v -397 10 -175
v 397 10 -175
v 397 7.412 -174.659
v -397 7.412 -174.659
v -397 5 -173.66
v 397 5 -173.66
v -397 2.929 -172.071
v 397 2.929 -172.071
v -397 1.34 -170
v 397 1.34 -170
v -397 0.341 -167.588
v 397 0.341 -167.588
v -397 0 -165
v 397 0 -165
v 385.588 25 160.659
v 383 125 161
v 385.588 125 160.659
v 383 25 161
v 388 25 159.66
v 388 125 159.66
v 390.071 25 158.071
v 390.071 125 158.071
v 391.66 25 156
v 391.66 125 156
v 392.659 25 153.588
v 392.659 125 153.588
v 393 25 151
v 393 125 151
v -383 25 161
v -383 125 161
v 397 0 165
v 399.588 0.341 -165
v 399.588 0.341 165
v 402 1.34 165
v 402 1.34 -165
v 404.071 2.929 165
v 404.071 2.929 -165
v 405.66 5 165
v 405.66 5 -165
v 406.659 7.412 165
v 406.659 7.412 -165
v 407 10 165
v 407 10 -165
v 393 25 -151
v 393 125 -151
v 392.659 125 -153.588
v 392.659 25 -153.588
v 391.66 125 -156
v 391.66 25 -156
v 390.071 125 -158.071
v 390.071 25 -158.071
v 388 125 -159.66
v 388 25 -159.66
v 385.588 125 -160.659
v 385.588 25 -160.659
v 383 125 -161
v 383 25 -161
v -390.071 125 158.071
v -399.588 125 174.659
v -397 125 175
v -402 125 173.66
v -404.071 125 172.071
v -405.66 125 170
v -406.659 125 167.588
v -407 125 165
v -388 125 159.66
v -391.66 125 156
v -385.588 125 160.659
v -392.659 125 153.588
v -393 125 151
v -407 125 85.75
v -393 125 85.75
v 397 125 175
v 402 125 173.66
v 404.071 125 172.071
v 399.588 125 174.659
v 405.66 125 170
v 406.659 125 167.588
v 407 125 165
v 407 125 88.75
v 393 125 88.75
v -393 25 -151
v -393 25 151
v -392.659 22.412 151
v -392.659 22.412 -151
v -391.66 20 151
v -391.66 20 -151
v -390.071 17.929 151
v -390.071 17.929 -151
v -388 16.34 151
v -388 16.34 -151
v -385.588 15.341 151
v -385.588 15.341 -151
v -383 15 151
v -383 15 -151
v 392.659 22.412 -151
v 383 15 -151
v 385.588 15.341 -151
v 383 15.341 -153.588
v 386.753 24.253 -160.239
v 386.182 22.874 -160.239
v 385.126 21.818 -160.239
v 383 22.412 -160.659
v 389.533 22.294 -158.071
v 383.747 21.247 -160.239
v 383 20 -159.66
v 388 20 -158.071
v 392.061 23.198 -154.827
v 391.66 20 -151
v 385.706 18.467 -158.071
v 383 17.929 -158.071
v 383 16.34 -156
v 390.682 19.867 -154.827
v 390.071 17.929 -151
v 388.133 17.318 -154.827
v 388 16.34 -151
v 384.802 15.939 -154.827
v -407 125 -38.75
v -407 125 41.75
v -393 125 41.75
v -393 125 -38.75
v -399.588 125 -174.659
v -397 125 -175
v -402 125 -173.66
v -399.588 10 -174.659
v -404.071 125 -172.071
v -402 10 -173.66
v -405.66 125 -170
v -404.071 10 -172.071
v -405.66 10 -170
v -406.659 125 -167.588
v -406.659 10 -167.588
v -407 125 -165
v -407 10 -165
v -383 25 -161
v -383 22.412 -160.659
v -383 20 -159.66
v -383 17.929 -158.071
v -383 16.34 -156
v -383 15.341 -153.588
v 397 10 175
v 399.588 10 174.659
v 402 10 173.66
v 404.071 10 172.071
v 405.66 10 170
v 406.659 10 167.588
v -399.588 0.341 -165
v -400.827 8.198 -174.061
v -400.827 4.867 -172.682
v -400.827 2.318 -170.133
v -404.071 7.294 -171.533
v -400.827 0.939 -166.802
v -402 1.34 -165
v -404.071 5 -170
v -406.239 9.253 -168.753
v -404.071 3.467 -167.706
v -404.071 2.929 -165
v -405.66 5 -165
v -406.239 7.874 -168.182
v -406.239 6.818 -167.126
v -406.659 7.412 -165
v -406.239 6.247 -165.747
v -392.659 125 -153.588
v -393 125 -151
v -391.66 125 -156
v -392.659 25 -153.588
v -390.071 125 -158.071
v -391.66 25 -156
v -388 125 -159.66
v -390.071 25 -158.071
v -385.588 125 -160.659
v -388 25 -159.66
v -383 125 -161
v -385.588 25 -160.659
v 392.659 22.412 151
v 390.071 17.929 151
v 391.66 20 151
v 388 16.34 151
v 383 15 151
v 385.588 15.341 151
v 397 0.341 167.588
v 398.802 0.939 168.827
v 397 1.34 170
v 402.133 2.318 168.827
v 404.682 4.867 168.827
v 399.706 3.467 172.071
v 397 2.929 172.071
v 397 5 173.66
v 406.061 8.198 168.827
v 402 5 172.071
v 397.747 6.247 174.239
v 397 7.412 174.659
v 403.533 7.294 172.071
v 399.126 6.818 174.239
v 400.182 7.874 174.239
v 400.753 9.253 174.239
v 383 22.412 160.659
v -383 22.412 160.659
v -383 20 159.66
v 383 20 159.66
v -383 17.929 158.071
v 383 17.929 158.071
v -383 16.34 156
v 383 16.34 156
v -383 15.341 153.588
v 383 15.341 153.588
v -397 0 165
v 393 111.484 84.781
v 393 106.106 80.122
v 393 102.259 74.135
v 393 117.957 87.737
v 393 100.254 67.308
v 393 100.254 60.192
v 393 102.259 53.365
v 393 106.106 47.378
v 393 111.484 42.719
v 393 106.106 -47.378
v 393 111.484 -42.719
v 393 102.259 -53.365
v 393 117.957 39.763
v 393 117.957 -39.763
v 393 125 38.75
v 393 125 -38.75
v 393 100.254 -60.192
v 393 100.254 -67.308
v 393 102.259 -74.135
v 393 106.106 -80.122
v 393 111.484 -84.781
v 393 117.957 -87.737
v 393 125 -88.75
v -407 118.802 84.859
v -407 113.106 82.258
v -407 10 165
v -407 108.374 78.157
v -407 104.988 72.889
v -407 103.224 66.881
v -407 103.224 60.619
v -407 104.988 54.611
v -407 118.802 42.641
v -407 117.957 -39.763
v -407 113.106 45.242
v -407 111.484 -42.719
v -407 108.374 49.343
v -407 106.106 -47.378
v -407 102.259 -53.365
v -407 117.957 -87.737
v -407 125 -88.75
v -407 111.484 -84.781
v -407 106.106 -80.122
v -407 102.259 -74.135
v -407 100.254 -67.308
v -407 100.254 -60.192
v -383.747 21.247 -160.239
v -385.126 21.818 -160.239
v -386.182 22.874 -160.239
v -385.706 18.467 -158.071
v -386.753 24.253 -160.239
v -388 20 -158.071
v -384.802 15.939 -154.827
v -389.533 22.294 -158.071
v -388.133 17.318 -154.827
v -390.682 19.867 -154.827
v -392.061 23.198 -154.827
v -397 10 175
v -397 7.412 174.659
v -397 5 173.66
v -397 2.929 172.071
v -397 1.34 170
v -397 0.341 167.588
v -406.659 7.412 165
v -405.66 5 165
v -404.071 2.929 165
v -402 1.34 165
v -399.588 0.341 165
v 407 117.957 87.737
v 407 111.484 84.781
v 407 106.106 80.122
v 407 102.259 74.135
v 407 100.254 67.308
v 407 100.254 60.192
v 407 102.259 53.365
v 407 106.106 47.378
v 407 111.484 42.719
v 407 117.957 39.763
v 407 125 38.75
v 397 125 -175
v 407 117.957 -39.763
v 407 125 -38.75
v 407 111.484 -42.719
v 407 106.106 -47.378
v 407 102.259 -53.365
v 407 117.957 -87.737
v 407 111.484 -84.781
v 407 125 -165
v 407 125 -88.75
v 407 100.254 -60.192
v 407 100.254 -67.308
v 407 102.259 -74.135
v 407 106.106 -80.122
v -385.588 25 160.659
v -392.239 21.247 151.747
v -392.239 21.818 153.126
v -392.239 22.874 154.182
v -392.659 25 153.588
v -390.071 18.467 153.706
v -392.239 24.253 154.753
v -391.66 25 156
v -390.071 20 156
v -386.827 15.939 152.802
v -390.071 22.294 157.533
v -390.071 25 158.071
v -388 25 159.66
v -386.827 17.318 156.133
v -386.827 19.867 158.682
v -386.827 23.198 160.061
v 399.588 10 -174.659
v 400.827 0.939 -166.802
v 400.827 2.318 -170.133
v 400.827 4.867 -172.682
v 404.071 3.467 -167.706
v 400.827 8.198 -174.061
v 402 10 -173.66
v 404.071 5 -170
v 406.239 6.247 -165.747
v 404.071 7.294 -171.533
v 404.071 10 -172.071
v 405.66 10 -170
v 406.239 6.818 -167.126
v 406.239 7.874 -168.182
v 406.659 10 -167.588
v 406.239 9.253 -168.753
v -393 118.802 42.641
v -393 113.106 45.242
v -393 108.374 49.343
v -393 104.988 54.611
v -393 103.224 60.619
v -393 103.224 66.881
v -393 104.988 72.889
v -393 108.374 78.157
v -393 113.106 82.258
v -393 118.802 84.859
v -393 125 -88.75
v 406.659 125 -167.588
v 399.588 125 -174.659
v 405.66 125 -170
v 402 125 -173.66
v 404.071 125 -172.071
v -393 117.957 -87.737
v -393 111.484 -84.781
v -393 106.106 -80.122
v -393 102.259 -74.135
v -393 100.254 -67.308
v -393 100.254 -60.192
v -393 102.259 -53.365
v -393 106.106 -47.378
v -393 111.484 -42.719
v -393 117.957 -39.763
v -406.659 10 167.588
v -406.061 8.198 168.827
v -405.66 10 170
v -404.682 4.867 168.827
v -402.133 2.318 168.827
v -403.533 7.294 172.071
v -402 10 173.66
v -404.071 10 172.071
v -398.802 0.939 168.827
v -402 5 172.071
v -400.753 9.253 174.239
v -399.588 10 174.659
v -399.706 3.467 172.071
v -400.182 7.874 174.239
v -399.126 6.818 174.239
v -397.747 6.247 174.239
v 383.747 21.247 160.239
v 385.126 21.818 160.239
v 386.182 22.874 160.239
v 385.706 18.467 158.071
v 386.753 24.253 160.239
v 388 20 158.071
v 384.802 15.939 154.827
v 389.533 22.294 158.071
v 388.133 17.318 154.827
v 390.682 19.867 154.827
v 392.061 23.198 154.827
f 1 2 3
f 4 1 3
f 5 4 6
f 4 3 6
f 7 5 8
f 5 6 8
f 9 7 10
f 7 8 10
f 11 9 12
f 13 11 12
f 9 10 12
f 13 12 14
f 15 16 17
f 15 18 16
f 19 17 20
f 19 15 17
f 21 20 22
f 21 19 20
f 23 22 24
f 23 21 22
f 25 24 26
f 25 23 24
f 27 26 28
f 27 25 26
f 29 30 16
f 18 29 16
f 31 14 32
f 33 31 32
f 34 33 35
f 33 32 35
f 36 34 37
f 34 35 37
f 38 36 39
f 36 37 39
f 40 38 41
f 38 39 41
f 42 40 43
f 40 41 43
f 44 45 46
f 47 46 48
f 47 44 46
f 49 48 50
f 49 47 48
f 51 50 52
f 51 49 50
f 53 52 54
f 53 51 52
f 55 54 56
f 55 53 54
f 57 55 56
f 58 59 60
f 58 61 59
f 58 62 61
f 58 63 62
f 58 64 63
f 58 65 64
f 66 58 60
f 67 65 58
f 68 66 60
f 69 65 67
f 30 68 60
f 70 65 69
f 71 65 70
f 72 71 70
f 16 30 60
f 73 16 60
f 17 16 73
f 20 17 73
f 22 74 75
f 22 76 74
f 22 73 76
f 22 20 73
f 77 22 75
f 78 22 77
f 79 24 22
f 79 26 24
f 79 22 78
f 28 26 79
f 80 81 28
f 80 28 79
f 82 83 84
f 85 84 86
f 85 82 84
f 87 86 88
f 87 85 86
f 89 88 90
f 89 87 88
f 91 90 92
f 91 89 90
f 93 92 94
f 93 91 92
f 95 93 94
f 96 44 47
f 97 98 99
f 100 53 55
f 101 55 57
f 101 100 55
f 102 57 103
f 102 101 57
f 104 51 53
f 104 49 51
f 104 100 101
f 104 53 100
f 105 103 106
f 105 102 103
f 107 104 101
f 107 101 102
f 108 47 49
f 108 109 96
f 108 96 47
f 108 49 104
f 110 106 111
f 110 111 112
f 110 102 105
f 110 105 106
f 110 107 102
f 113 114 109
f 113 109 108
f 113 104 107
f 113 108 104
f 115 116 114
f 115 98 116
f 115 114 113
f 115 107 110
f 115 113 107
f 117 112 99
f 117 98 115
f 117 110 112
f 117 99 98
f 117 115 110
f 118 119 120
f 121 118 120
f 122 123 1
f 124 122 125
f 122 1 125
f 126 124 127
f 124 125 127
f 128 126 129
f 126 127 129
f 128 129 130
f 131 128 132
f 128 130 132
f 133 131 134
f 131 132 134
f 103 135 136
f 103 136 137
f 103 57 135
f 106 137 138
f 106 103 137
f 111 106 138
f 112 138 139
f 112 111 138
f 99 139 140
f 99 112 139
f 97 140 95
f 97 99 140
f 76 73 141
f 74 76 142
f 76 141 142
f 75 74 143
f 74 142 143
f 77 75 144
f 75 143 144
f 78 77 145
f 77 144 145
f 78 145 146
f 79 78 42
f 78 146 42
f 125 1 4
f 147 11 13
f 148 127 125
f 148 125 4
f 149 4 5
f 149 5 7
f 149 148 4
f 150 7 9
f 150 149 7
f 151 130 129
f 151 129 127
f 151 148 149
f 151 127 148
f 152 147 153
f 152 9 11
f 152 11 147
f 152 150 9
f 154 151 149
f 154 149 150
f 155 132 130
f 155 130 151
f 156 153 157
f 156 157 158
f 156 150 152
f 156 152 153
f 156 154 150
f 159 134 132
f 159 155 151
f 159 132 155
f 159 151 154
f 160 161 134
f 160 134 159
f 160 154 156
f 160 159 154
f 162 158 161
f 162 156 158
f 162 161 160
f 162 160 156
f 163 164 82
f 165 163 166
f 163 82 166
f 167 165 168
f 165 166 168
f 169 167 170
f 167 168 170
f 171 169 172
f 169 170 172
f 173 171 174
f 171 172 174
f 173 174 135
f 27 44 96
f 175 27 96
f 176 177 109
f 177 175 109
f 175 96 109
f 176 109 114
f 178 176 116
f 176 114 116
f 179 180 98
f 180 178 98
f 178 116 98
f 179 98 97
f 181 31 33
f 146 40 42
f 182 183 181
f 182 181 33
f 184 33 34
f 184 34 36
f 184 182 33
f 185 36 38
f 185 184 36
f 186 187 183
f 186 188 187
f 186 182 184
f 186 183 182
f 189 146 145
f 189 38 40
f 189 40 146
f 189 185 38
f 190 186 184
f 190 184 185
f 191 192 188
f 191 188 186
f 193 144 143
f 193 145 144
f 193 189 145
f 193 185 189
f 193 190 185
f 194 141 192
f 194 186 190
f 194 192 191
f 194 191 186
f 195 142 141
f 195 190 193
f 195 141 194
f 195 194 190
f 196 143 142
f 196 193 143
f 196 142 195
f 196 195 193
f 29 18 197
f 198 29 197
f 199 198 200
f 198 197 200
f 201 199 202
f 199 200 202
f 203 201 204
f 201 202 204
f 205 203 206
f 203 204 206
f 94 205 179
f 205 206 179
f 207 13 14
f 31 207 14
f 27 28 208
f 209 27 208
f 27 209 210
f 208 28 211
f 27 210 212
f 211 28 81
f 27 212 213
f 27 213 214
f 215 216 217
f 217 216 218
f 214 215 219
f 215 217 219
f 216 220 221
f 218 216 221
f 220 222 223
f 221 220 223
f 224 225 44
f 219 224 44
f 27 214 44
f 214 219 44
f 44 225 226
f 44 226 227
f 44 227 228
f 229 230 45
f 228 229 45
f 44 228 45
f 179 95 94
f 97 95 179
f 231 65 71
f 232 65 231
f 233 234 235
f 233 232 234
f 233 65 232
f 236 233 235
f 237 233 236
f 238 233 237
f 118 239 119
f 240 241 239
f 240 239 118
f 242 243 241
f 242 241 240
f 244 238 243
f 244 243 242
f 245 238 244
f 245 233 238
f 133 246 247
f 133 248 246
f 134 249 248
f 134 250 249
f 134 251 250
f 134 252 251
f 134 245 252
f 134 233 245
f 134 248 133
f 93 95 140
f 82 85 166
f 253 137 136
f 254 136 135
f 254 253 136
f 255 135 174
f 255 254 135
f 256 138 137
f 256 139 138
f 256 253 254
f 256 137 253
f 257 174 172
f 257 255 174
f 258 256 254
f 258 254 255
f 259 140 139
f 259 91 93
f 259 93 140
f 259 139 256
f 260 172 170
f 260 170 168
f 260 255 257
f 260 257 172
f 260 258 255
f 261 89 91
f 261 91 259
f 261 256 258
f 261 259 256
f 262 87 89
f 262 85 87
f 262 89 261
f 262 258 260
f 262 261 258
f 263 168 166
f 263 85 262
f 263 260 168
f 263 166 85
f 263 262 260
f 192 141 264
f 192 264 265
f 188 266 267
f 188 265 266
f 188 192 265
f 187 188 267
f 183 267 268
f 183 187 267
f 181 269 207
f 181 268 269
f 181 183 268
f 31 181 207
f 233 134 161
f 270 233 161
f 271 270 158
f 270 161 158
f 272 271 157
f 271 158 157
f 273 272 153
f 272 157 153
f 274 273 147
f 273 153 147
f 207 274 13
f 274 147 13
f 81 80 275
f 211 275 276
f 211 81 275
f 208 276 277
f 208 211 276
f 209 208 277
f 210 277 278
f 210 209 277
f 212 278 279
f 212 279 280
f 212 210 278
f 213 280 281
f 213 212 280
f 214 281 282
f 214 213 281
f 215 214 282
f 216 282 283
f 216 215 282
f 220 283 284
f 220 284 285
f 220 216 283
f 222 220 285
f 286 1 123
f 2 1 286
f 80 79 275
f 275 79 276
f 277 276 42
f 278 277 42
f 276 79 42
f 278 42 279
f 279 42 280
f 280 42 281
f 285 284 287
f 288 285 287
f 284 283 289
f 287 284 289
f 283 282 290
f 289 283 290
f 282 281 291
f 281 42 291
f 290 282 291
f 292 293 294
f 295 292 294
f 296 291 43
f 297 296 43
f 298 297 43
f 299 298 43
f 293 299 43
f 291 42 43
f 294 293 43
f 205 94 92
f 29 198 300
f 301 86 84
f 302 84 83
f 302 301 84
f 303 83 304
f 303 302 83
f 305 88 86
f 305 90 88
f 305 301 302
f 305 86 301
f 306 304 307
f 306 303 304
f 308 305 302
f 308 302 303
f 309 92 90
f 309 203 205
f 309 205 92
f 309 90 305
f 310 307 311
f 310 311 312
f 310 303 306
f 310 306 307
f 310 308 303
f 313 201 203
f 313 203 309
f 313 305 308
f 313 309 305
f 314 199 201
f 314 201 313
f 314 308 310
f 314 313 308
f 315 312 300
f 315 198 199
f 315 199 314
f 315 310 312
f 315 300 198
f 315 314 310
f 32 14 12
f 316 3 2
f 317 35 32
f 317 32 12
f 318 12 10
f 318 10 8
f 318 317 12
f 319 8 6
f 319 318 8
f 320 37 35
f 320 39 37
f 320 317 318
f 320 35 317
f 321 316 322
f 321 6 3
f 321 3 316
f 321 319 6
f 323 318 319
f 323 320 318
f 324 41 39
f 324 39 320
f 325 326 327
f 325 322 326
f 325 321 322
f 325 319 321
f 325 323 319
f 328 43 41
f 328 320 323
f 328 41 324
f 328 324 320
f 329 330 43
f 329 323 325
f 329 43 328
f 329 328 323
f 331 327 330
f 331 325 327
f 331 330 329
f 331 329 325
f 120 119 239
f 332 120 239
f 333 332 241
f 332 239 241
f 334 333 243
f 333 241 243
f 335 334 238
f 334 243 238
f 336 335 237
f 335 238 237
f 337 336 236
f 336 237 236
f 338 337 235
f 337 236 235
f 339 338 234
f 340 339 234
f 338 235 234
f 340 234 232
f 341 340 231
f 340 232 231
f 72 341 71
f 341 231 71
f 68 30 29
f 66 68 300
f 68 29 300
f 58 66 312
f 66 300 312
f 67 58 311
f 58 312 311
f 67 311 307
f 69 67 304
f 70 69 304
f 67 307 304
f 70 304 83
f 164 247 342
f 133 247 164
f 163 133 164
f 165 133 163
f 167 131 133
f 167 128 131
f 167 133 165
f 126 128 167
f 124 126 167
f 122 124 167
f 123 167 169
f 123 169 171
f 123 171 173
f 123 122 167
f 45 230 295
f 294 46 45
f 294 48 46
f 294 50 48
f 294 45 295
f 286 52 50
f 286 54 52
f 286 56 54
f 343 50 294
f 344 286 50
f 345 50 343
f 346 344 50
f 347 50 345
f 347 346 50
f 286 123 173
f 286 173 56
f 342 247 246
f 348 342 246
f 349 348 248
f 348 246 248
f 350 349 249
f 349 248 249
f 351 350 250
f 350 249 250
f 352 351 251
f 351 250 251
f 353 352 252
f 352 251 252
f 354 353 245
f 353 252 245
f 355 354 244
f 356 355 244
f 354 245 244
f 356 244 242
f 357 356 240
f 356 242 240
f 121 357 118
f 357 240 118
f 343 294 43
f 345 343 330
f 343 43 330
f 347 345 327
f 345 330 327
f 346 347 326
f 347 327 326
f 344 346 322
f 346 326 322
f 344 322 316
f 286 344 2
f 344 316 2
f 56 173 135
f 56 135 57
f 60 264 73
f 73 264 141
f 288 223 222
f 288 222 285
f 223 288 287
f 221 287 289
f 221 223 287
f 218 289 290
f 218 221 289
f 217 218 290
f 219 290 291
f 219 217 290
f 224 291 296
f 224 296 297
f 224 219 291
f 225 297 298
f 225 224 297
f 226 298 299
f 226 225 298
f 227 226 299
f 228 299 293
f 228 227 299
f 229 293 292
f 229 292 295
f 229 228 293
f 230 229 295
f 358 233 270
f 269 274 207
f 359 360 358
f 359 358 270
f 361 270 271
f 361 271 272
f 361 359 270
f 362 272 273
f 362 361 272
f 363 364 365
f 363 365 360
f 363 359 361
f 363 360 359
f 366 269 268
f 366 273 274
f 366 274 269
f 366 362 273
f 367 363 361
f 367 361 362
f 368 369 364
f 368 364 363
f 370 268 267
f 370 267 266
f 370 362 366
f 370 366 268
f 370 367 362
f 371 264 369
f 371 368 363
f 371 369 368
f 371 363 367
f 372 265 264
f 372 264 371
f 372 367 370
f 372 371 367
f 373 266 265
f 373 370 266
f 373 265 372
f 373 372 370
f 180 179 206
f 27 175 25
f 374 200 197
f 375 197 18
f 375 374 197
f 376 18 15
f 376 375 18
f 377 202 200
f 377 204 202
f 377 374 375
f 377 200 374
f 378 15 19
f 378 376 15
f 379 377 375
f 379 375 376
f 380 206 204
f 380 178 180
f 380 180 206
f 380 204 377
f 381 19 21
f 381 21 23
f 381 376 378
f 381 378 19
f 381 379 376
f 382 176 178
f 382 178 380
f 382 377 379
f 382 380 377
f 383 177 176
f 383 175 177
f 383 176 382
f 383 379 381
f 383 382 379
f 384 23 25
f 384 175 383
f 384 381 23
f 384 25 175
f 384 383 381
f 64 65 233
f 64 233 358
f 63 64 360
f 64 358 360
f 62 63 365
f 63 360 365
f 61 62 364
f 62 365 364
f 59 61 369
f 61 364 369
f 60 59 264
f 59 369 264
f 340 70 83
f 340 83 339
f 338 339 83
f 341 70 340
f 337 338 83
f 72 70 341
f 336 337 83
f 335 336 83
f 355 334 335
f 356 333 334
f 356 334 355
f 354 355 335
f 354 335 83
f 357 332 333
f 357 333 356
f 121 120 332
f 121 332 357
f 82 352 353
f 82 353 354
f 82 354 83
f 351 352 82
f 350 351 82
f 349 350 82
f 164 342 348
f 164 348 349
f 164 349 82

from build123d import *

# Parameters (mm, degrees)
SKETCH1_W           = 814
SKETCH1_H           = 350
BOSS_EXTRUDE1_DEPTH = 125
SKETCH2_W           = 786
SKETCH2_H           = 322
CUT_EXTRUDE1_DEPTH  = 110
FILLET1_R           = 10
FILLET2_R           = 10
FILLET3_R           = 10
SKETCH4_R           = 25
SKETCH4_R_2         = 22
CUT_EXTRUDE2_DEPTH  = 110
CUT_EXTRUDE3_START  = -110
SKETCH5_R           = 25
CUT_EXTRUDE3_DEPTH  = 110


with BuildPart() as part:
    # Sketch1 → Boss-Extrude1 (new body)
    with BuildSketch(Plane(origin=(0, 0, 0), x_dir=(1, 0, 0), z_dir=(0, 1, 0))):
        Rectangle(SKETCH1_W, SKETCH1_H)
    extrude(amount=BOSS_EXTRUDE1_DEPTH)

    # Sketch2 → Cut-Extrude1 (cut)
    with BuildSketch(Plane(origin=(0, 125, 0), x_dir=(1, 0, 0), z_dir=(0, 1, 0))):
        Rectangle(SKETCH2_W, SKETCH2_H)
    extrude(amount=-CUT_EXTRUDE1_DEPTH, mode=Mode.SUBTRACT)

    # Fillet1
    fillet1_edges = [part.edges().sort_by_distance(p)[0] for p in [
        (0, 0, -175),
        (407, 0, 0),
        (0, 0, 175),
        (-407, 0, 0),
    ]]
    fillet(fillet1_edges, radius=FILLET1_R)

    # Fillet2
    # the kernel refuses this fillet: 10 mm, written as the material it takes off along each edge
    with BuildSketch(Plane(origin=(397, 10, -165), x_dir=(0, 0, -1), z_dir=(1, 0, 0))) as fillet2_piece_1_section:
        Polygon((0, 0), (FILLET2_R, 0), (FILLET2_R, -FILLET2_R), (0, -FILLET2_R), align=None)
    fillet2_piece_1 = extrude(amount=FILLET2_R, mode=Mode.PRIVATE)
    fillet2_piece_1 = fillet2_piece_1 - Plane(origin=(397, 10, -165), x_dir=(0, 0.7071067811865475, 0.7071067811865475), z_dir=(1, 0, 0)) * Sphere(FILLET2_R, mode=Mode.PRIVATE)
    add(fillet2_piece_1, mode=Mode.SUBTRACT)
    with BuildSketch(Plane(origin=(397, 10, 165), x_dir=(1, 0, 0), z_dir=(0, 0, 1))) as fillet2_piece_2_section:
        Polygon((0, 0), (FILLET2_R, 0), (FILLET2_R, -FILLET2_R), (0, -FILLET2_R), align=None)
    fillet2_piece_2 = extrude(amount=FILLET2_R, mode=Mode.PRIVATE)
    fillet2_piece_2 = fillet2_piece_2 - Plane(origin=(397, 10, 165), x_dir=(-0.7071067811865475, 0.7071067811865475, 0), z_dir=(0, 0, 1)) * Sphere(FILLET2_R, mode=Mode.PRIVATE)
    add(fillet2_piece_2, mode=Mode.SUBTRACT)
    with BuildSketch(Plane(origin=(-397, 10, -165), x_dir=(0, 0, -1), z_dir=(-1, 0, 0))) as fillet2_piece_3_section:
        Polygon((0, 0), (FILLET2_R, 0), (FILLET2_R, FILLET2_R), (0, FILLET2_R), align=None)
    fillet2_piece_3 = extrude(amount=FILLET2_R, mode=Mode.PRIVATE)
    fillet2_piece_3 = fillet2_piece_3 - Plane(origin=(-397, 10, -165), x_dir=(0, 0.7071067811865475, 0.7071067811865475), z_dir=(-1, 0, 0)) * Sphere(FILLET2_R, mode=Mode.PRIVATE)
    add(fillet2_piece_3, mode=Mode.SUBTRACT)
    with BuildSketch(Plane(origin=(-397, 10, 165), x_dir=(-1, 0, 0), z_dir=(0, 0, 1))) as fillet2_piece_4_section:
        Polygon((0, 0), (FILLET2_R, 0), (FILLET2_R, FILLET2_R), (0, FILLET2_R), align=None)
    fillet2_piece_4 = extrude(amount=FILLET2_R, mode=Mode.PRIVATE)
    fillet2_piece_4 = fillet2_piece_4 - Plane(origin=(-397, 10, 165), x_dir=(0.7071067811865475, 0.7071067811865475, 0), z_dir=(0, 0, 1)) * Sphere(FILLET2_R, mode=Mode.PRIVATE)
    add(fillet2_piece_4, mode=Mode.SUBTRACT)
    with BuildSketch(Plane(origin=(-407, 10, -175), x_dir=(0, 0, 1), z_dir=(0, 1, 0)), Plane(origin=(-407, 10, 175), x_dir=(1, 0, 0), z_dir=(0, 1, 0))) as fillet2_piece_5:
        with BuildLine():
            CenterArc((FILLET2_R, FILLET2_R), FILLET2_R, 180, 90)
            Line((0, FILLET2_R), (0, 0))
            Line((0, 0), (FILLET2_R, 0))
        make_face()
    extrude(amount=140, mode=Mode.SUBTRACT)
    with BuildSketch(Plane(origin=(407, 10, -175), x_dir=(0, 0, 1), z_dir=(0, 1, 0)), Plane(origin=(407, 10, 175), x_dir=(-1, 0, 0), z_dir=(0, 1, 0))) as fillet2_piece_6:
        with BuildLine():
            CenterArc((FILLET2_R, -FILLET2_R), FILLET2_R, 90, 90)
            Line((0, -FILLET2_R), (0, 0))
            Line((0, 0), (FILLET2_R, 0))
        make_face()
    extrude(amount=140, mode=Mode.SUBTRACT)

    # Fillet3
    fillet3_edges = [part.edges().sort_by_distance(p)[0] for p in [
        (393, 15, 0),
        (393, 70, -161),
        (0, 15, 161),
        (393, 70, 161),
        (-393, 15, 0),
        (-393, 70, 161),
        (0, 15, -161),
        (-393, 70, -161),
    ]]
    fillet(fillet3_edges, radius=FILLET3_R)

    # Sketch4 → Cut-Extrude2 (cut)
    with BuildSketch(Plane.ZY.offset(407)):
        with Locations((-63.75, 125)):
            Circle(SKETCH4_R)
        with Locations((63.75, 125)):
            Circle(SKETCH4_R_2)
    extrude(amount=-CUT_EXTRUDE2_DEPTH, mode=Mode.SUBTRACT)

    # Sketch5 → Cut-Extrude3 (cut)
    with BuildSketch(Plane(origin=(407, 0, 0), x_dir=(0, 0, -1), z_dir=(1, 0, 0)).offset(CUT_EXTRUDE3_START)):
        with Locations((-63.75, 125)):
            Circle(SKETCH5_R)
        with Locations((63.75, 125)):
            Circle(SKETCH5_R)
    extrude(amount=CUT_EXTRUDE3_DEPTH, mode=Mode.SUBTRACT)


solid = part.part
